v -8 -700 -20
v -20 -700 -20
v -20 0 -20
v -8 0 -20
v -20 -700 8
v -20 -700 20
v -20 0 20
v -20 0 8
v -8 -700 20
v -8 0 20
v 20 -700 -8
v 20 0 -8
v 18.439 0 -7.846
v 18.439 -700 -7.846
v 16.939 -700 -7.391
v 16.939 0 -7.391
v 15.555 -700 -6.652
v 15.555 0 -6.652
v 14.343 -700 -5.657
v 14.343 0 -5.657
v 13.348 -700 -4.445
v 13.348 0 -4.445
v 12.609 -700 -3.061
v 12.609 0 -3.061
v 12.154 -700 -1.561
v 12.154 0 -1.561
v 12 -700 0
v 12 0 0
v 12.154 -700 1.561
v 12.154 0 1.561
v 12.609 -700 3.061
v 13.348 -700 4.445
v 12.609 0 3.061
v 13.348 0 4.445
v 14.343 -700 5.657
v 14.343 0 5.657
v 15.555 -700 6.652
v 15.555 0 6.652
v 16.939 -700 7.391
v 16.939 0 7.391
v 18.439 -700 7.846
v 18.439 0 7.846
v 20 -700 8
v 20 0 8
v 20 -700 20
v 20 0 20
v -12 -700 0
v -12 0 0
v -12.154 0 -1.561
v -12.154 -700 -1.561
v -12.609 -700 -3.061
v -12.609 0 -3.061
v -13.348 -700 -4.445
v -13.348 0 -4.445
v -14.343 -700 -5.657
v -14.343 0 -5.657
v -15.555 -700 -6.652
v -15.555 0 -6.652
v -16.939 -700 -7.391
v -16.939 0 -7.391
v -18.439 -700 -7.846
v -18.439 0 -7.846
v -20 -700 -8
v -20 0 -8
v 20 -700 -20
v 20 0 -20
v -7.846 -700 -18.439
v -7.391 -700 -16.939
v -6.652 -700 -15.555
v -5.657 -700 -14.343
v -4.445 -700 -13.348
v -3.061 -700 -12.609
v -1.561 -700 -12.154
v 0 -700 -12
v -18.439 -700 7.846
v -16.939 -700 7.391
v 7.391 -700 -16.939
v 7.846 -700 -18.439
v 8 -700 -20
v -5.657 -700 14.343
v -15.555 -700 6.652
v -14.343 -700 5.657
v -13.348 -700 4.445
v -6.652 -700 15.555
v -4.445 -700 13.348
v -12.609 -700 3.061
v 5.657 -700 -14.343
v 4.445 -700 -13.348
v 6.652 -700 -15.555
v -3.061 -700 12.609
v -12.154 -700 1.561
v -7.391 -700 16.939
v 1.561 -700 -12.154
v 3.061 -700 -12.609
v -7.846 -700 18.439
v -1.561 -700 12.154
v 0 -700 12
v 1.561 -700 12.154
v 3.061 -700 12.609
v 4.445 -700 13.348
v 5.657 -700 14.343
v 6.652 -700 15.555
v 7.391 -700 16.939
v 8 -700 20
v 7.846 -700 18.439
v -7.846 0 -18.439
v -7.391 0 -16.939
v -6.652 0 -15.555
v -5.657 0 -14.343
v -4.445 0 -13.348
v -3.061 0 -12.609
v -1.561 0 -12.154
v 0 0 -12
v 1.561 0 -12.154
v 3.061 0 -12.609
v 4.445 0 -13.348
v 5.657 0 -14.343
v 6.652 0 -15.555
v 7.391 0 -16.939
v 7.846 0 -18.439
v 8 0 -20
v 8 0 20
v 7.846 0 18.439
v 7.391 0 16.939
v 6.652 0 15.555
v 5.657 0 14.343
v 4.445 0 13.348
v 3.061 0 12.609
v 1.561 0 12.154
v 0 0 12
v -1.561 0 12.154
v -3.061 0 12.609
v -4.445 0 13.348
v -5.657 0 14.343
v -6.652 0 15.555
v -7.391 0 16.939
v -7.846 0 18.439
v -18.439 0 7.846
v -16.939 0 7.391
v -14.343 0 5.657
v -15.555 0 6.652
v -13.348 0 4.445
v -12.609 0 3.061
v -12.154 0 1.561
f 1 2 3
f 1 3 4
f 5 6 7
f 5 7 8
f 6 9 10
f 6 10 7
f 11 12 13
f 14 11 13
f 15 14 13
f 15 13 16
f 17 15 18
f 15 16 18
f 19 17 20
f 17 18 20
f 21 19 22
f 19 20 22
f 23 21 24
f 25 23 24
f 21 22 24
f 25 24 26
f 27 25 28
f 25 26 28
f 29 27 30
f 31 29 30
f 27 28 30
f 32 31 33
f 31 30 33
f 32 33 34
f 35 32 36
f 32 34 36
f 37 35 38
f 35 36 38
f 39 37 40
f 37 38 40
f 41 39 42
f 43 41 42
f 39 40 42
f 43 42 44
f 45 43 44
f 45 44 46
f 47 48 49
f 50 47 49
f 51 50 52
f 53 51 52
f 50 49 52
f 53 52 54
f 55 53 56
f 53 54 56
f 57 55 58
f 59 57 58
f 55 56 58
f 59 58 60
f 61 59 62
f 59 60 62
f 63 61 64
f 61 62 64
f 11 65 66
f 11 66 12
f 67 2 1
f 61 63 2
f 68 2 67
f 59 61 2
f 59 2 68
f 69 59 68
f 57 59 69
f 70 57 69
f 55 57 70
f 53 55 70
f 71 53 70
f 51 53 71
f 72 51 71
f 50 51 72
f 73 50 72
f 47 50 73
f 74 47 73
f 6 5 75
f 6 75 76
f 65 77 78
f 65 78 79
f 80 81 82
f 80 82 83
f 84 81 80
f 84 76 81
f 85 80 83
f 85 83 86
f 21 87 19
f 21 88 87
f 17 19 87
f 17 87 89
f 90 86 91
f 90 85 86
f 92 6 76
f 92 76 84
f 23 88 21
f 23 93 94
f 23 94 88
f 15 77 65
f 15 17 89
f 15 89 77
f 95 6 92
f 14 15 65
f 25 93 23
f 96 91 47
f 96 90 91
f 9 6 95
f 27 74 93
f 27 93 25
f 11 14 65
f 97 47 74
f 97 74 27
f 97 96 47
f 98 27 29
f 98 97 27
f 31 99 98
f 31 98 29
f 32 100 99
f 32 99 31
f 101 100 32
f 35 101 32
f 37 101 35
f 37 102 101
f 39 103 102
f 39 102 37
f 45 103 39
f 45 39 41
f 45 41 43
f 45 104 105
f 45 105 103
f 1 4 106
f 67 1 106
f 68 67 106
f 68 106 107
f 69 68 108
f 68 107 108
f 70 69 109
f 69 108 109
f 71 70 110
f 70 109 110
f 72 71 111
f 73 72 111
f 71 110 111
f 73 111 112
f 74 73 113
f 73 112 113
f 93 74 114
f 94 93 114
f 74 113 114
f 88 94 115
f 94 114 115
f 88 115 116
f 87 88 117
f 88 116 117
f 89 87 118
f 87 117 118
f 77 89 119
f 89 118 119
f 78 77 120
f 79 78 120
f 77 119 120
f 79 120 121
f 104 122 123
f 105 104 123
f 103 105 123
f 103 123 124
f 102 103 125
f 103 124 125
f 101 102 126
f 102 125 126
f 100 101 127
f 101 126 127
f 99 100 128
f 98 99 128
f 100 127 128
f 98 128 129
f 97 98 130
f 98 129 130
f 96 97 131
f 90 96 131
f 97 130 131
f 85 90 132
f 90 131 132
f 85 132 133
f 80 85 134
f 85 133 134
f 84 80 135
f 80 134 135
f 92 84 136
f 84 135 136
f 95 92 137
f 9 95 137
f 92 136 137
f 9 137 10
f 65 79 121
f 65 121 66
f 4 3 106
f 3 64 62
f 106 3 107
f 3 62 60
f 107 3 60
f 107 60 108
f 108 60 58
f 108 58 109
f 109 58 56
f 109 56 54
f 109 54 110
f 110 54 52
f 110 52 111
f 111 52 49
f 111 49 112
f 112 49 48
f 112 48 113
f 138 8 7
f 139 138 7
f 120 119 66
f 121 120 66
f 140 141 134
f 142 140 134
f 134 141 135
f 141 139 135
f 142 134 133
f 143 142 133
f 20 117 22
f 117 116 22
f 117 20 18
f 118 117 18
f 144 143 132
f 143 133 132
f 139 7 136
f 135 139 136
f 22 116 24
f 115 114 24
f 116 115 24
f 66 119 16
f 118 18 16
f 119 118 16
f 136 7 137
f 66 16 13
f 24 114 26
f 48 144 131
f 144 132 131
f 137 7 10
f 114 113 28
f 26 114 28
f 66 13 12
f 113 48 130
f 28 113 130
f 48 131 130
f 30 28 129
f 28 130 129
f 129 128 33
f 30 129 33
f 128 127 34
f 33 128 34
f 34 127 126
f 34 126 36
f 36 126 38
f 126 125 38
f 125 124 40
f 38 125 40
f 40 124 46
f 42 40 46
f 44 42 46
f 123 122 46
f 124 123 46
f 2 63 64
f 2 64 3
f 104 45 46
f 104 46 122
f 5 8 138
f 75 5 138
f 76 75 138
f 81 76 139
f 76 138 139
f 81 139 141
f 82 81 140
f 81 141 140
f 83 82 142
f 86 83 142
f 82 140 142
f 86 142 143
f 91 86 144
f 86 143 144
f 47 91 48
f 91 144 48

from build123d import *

# Parameters (mm, degrees)
F1_DEPTH = 700


with BuildPart() as f1:
    # F0 (on Front) → F1 (new body)
    with BuildSketch(Plane.XZ):
        with BuildLine():
            Line((8, -20), (20, -20))
            Line((20, -20), (20, -8))
            ThreePointArc((20, -8), (12, 0), (20, 8))
            Line((20, 8), (20, 20))
            Line((20, 20), (8, 20))
            ThreePointArc((8, 20), (0, 12), (-8, 20))
            Line((-8, 20), (-20, 20))
            Line((-20, 20), (-20, 8))
            ThreePointArc((-20, 8), (-14.343146, 5.656854), (-12, 0))
            ThreePointArc((-12, 0), (-14.343146, -5.656854), (-20, -8))
            Line((-20, -8), (-20, -20))
            Line((-20, -20), (-8, -20))
            ThreePointArc((-8, -20), (0, -12), (8, -20))
        make_face()
    extrude(amount=F1_DEPTH)


solid = f1.part
